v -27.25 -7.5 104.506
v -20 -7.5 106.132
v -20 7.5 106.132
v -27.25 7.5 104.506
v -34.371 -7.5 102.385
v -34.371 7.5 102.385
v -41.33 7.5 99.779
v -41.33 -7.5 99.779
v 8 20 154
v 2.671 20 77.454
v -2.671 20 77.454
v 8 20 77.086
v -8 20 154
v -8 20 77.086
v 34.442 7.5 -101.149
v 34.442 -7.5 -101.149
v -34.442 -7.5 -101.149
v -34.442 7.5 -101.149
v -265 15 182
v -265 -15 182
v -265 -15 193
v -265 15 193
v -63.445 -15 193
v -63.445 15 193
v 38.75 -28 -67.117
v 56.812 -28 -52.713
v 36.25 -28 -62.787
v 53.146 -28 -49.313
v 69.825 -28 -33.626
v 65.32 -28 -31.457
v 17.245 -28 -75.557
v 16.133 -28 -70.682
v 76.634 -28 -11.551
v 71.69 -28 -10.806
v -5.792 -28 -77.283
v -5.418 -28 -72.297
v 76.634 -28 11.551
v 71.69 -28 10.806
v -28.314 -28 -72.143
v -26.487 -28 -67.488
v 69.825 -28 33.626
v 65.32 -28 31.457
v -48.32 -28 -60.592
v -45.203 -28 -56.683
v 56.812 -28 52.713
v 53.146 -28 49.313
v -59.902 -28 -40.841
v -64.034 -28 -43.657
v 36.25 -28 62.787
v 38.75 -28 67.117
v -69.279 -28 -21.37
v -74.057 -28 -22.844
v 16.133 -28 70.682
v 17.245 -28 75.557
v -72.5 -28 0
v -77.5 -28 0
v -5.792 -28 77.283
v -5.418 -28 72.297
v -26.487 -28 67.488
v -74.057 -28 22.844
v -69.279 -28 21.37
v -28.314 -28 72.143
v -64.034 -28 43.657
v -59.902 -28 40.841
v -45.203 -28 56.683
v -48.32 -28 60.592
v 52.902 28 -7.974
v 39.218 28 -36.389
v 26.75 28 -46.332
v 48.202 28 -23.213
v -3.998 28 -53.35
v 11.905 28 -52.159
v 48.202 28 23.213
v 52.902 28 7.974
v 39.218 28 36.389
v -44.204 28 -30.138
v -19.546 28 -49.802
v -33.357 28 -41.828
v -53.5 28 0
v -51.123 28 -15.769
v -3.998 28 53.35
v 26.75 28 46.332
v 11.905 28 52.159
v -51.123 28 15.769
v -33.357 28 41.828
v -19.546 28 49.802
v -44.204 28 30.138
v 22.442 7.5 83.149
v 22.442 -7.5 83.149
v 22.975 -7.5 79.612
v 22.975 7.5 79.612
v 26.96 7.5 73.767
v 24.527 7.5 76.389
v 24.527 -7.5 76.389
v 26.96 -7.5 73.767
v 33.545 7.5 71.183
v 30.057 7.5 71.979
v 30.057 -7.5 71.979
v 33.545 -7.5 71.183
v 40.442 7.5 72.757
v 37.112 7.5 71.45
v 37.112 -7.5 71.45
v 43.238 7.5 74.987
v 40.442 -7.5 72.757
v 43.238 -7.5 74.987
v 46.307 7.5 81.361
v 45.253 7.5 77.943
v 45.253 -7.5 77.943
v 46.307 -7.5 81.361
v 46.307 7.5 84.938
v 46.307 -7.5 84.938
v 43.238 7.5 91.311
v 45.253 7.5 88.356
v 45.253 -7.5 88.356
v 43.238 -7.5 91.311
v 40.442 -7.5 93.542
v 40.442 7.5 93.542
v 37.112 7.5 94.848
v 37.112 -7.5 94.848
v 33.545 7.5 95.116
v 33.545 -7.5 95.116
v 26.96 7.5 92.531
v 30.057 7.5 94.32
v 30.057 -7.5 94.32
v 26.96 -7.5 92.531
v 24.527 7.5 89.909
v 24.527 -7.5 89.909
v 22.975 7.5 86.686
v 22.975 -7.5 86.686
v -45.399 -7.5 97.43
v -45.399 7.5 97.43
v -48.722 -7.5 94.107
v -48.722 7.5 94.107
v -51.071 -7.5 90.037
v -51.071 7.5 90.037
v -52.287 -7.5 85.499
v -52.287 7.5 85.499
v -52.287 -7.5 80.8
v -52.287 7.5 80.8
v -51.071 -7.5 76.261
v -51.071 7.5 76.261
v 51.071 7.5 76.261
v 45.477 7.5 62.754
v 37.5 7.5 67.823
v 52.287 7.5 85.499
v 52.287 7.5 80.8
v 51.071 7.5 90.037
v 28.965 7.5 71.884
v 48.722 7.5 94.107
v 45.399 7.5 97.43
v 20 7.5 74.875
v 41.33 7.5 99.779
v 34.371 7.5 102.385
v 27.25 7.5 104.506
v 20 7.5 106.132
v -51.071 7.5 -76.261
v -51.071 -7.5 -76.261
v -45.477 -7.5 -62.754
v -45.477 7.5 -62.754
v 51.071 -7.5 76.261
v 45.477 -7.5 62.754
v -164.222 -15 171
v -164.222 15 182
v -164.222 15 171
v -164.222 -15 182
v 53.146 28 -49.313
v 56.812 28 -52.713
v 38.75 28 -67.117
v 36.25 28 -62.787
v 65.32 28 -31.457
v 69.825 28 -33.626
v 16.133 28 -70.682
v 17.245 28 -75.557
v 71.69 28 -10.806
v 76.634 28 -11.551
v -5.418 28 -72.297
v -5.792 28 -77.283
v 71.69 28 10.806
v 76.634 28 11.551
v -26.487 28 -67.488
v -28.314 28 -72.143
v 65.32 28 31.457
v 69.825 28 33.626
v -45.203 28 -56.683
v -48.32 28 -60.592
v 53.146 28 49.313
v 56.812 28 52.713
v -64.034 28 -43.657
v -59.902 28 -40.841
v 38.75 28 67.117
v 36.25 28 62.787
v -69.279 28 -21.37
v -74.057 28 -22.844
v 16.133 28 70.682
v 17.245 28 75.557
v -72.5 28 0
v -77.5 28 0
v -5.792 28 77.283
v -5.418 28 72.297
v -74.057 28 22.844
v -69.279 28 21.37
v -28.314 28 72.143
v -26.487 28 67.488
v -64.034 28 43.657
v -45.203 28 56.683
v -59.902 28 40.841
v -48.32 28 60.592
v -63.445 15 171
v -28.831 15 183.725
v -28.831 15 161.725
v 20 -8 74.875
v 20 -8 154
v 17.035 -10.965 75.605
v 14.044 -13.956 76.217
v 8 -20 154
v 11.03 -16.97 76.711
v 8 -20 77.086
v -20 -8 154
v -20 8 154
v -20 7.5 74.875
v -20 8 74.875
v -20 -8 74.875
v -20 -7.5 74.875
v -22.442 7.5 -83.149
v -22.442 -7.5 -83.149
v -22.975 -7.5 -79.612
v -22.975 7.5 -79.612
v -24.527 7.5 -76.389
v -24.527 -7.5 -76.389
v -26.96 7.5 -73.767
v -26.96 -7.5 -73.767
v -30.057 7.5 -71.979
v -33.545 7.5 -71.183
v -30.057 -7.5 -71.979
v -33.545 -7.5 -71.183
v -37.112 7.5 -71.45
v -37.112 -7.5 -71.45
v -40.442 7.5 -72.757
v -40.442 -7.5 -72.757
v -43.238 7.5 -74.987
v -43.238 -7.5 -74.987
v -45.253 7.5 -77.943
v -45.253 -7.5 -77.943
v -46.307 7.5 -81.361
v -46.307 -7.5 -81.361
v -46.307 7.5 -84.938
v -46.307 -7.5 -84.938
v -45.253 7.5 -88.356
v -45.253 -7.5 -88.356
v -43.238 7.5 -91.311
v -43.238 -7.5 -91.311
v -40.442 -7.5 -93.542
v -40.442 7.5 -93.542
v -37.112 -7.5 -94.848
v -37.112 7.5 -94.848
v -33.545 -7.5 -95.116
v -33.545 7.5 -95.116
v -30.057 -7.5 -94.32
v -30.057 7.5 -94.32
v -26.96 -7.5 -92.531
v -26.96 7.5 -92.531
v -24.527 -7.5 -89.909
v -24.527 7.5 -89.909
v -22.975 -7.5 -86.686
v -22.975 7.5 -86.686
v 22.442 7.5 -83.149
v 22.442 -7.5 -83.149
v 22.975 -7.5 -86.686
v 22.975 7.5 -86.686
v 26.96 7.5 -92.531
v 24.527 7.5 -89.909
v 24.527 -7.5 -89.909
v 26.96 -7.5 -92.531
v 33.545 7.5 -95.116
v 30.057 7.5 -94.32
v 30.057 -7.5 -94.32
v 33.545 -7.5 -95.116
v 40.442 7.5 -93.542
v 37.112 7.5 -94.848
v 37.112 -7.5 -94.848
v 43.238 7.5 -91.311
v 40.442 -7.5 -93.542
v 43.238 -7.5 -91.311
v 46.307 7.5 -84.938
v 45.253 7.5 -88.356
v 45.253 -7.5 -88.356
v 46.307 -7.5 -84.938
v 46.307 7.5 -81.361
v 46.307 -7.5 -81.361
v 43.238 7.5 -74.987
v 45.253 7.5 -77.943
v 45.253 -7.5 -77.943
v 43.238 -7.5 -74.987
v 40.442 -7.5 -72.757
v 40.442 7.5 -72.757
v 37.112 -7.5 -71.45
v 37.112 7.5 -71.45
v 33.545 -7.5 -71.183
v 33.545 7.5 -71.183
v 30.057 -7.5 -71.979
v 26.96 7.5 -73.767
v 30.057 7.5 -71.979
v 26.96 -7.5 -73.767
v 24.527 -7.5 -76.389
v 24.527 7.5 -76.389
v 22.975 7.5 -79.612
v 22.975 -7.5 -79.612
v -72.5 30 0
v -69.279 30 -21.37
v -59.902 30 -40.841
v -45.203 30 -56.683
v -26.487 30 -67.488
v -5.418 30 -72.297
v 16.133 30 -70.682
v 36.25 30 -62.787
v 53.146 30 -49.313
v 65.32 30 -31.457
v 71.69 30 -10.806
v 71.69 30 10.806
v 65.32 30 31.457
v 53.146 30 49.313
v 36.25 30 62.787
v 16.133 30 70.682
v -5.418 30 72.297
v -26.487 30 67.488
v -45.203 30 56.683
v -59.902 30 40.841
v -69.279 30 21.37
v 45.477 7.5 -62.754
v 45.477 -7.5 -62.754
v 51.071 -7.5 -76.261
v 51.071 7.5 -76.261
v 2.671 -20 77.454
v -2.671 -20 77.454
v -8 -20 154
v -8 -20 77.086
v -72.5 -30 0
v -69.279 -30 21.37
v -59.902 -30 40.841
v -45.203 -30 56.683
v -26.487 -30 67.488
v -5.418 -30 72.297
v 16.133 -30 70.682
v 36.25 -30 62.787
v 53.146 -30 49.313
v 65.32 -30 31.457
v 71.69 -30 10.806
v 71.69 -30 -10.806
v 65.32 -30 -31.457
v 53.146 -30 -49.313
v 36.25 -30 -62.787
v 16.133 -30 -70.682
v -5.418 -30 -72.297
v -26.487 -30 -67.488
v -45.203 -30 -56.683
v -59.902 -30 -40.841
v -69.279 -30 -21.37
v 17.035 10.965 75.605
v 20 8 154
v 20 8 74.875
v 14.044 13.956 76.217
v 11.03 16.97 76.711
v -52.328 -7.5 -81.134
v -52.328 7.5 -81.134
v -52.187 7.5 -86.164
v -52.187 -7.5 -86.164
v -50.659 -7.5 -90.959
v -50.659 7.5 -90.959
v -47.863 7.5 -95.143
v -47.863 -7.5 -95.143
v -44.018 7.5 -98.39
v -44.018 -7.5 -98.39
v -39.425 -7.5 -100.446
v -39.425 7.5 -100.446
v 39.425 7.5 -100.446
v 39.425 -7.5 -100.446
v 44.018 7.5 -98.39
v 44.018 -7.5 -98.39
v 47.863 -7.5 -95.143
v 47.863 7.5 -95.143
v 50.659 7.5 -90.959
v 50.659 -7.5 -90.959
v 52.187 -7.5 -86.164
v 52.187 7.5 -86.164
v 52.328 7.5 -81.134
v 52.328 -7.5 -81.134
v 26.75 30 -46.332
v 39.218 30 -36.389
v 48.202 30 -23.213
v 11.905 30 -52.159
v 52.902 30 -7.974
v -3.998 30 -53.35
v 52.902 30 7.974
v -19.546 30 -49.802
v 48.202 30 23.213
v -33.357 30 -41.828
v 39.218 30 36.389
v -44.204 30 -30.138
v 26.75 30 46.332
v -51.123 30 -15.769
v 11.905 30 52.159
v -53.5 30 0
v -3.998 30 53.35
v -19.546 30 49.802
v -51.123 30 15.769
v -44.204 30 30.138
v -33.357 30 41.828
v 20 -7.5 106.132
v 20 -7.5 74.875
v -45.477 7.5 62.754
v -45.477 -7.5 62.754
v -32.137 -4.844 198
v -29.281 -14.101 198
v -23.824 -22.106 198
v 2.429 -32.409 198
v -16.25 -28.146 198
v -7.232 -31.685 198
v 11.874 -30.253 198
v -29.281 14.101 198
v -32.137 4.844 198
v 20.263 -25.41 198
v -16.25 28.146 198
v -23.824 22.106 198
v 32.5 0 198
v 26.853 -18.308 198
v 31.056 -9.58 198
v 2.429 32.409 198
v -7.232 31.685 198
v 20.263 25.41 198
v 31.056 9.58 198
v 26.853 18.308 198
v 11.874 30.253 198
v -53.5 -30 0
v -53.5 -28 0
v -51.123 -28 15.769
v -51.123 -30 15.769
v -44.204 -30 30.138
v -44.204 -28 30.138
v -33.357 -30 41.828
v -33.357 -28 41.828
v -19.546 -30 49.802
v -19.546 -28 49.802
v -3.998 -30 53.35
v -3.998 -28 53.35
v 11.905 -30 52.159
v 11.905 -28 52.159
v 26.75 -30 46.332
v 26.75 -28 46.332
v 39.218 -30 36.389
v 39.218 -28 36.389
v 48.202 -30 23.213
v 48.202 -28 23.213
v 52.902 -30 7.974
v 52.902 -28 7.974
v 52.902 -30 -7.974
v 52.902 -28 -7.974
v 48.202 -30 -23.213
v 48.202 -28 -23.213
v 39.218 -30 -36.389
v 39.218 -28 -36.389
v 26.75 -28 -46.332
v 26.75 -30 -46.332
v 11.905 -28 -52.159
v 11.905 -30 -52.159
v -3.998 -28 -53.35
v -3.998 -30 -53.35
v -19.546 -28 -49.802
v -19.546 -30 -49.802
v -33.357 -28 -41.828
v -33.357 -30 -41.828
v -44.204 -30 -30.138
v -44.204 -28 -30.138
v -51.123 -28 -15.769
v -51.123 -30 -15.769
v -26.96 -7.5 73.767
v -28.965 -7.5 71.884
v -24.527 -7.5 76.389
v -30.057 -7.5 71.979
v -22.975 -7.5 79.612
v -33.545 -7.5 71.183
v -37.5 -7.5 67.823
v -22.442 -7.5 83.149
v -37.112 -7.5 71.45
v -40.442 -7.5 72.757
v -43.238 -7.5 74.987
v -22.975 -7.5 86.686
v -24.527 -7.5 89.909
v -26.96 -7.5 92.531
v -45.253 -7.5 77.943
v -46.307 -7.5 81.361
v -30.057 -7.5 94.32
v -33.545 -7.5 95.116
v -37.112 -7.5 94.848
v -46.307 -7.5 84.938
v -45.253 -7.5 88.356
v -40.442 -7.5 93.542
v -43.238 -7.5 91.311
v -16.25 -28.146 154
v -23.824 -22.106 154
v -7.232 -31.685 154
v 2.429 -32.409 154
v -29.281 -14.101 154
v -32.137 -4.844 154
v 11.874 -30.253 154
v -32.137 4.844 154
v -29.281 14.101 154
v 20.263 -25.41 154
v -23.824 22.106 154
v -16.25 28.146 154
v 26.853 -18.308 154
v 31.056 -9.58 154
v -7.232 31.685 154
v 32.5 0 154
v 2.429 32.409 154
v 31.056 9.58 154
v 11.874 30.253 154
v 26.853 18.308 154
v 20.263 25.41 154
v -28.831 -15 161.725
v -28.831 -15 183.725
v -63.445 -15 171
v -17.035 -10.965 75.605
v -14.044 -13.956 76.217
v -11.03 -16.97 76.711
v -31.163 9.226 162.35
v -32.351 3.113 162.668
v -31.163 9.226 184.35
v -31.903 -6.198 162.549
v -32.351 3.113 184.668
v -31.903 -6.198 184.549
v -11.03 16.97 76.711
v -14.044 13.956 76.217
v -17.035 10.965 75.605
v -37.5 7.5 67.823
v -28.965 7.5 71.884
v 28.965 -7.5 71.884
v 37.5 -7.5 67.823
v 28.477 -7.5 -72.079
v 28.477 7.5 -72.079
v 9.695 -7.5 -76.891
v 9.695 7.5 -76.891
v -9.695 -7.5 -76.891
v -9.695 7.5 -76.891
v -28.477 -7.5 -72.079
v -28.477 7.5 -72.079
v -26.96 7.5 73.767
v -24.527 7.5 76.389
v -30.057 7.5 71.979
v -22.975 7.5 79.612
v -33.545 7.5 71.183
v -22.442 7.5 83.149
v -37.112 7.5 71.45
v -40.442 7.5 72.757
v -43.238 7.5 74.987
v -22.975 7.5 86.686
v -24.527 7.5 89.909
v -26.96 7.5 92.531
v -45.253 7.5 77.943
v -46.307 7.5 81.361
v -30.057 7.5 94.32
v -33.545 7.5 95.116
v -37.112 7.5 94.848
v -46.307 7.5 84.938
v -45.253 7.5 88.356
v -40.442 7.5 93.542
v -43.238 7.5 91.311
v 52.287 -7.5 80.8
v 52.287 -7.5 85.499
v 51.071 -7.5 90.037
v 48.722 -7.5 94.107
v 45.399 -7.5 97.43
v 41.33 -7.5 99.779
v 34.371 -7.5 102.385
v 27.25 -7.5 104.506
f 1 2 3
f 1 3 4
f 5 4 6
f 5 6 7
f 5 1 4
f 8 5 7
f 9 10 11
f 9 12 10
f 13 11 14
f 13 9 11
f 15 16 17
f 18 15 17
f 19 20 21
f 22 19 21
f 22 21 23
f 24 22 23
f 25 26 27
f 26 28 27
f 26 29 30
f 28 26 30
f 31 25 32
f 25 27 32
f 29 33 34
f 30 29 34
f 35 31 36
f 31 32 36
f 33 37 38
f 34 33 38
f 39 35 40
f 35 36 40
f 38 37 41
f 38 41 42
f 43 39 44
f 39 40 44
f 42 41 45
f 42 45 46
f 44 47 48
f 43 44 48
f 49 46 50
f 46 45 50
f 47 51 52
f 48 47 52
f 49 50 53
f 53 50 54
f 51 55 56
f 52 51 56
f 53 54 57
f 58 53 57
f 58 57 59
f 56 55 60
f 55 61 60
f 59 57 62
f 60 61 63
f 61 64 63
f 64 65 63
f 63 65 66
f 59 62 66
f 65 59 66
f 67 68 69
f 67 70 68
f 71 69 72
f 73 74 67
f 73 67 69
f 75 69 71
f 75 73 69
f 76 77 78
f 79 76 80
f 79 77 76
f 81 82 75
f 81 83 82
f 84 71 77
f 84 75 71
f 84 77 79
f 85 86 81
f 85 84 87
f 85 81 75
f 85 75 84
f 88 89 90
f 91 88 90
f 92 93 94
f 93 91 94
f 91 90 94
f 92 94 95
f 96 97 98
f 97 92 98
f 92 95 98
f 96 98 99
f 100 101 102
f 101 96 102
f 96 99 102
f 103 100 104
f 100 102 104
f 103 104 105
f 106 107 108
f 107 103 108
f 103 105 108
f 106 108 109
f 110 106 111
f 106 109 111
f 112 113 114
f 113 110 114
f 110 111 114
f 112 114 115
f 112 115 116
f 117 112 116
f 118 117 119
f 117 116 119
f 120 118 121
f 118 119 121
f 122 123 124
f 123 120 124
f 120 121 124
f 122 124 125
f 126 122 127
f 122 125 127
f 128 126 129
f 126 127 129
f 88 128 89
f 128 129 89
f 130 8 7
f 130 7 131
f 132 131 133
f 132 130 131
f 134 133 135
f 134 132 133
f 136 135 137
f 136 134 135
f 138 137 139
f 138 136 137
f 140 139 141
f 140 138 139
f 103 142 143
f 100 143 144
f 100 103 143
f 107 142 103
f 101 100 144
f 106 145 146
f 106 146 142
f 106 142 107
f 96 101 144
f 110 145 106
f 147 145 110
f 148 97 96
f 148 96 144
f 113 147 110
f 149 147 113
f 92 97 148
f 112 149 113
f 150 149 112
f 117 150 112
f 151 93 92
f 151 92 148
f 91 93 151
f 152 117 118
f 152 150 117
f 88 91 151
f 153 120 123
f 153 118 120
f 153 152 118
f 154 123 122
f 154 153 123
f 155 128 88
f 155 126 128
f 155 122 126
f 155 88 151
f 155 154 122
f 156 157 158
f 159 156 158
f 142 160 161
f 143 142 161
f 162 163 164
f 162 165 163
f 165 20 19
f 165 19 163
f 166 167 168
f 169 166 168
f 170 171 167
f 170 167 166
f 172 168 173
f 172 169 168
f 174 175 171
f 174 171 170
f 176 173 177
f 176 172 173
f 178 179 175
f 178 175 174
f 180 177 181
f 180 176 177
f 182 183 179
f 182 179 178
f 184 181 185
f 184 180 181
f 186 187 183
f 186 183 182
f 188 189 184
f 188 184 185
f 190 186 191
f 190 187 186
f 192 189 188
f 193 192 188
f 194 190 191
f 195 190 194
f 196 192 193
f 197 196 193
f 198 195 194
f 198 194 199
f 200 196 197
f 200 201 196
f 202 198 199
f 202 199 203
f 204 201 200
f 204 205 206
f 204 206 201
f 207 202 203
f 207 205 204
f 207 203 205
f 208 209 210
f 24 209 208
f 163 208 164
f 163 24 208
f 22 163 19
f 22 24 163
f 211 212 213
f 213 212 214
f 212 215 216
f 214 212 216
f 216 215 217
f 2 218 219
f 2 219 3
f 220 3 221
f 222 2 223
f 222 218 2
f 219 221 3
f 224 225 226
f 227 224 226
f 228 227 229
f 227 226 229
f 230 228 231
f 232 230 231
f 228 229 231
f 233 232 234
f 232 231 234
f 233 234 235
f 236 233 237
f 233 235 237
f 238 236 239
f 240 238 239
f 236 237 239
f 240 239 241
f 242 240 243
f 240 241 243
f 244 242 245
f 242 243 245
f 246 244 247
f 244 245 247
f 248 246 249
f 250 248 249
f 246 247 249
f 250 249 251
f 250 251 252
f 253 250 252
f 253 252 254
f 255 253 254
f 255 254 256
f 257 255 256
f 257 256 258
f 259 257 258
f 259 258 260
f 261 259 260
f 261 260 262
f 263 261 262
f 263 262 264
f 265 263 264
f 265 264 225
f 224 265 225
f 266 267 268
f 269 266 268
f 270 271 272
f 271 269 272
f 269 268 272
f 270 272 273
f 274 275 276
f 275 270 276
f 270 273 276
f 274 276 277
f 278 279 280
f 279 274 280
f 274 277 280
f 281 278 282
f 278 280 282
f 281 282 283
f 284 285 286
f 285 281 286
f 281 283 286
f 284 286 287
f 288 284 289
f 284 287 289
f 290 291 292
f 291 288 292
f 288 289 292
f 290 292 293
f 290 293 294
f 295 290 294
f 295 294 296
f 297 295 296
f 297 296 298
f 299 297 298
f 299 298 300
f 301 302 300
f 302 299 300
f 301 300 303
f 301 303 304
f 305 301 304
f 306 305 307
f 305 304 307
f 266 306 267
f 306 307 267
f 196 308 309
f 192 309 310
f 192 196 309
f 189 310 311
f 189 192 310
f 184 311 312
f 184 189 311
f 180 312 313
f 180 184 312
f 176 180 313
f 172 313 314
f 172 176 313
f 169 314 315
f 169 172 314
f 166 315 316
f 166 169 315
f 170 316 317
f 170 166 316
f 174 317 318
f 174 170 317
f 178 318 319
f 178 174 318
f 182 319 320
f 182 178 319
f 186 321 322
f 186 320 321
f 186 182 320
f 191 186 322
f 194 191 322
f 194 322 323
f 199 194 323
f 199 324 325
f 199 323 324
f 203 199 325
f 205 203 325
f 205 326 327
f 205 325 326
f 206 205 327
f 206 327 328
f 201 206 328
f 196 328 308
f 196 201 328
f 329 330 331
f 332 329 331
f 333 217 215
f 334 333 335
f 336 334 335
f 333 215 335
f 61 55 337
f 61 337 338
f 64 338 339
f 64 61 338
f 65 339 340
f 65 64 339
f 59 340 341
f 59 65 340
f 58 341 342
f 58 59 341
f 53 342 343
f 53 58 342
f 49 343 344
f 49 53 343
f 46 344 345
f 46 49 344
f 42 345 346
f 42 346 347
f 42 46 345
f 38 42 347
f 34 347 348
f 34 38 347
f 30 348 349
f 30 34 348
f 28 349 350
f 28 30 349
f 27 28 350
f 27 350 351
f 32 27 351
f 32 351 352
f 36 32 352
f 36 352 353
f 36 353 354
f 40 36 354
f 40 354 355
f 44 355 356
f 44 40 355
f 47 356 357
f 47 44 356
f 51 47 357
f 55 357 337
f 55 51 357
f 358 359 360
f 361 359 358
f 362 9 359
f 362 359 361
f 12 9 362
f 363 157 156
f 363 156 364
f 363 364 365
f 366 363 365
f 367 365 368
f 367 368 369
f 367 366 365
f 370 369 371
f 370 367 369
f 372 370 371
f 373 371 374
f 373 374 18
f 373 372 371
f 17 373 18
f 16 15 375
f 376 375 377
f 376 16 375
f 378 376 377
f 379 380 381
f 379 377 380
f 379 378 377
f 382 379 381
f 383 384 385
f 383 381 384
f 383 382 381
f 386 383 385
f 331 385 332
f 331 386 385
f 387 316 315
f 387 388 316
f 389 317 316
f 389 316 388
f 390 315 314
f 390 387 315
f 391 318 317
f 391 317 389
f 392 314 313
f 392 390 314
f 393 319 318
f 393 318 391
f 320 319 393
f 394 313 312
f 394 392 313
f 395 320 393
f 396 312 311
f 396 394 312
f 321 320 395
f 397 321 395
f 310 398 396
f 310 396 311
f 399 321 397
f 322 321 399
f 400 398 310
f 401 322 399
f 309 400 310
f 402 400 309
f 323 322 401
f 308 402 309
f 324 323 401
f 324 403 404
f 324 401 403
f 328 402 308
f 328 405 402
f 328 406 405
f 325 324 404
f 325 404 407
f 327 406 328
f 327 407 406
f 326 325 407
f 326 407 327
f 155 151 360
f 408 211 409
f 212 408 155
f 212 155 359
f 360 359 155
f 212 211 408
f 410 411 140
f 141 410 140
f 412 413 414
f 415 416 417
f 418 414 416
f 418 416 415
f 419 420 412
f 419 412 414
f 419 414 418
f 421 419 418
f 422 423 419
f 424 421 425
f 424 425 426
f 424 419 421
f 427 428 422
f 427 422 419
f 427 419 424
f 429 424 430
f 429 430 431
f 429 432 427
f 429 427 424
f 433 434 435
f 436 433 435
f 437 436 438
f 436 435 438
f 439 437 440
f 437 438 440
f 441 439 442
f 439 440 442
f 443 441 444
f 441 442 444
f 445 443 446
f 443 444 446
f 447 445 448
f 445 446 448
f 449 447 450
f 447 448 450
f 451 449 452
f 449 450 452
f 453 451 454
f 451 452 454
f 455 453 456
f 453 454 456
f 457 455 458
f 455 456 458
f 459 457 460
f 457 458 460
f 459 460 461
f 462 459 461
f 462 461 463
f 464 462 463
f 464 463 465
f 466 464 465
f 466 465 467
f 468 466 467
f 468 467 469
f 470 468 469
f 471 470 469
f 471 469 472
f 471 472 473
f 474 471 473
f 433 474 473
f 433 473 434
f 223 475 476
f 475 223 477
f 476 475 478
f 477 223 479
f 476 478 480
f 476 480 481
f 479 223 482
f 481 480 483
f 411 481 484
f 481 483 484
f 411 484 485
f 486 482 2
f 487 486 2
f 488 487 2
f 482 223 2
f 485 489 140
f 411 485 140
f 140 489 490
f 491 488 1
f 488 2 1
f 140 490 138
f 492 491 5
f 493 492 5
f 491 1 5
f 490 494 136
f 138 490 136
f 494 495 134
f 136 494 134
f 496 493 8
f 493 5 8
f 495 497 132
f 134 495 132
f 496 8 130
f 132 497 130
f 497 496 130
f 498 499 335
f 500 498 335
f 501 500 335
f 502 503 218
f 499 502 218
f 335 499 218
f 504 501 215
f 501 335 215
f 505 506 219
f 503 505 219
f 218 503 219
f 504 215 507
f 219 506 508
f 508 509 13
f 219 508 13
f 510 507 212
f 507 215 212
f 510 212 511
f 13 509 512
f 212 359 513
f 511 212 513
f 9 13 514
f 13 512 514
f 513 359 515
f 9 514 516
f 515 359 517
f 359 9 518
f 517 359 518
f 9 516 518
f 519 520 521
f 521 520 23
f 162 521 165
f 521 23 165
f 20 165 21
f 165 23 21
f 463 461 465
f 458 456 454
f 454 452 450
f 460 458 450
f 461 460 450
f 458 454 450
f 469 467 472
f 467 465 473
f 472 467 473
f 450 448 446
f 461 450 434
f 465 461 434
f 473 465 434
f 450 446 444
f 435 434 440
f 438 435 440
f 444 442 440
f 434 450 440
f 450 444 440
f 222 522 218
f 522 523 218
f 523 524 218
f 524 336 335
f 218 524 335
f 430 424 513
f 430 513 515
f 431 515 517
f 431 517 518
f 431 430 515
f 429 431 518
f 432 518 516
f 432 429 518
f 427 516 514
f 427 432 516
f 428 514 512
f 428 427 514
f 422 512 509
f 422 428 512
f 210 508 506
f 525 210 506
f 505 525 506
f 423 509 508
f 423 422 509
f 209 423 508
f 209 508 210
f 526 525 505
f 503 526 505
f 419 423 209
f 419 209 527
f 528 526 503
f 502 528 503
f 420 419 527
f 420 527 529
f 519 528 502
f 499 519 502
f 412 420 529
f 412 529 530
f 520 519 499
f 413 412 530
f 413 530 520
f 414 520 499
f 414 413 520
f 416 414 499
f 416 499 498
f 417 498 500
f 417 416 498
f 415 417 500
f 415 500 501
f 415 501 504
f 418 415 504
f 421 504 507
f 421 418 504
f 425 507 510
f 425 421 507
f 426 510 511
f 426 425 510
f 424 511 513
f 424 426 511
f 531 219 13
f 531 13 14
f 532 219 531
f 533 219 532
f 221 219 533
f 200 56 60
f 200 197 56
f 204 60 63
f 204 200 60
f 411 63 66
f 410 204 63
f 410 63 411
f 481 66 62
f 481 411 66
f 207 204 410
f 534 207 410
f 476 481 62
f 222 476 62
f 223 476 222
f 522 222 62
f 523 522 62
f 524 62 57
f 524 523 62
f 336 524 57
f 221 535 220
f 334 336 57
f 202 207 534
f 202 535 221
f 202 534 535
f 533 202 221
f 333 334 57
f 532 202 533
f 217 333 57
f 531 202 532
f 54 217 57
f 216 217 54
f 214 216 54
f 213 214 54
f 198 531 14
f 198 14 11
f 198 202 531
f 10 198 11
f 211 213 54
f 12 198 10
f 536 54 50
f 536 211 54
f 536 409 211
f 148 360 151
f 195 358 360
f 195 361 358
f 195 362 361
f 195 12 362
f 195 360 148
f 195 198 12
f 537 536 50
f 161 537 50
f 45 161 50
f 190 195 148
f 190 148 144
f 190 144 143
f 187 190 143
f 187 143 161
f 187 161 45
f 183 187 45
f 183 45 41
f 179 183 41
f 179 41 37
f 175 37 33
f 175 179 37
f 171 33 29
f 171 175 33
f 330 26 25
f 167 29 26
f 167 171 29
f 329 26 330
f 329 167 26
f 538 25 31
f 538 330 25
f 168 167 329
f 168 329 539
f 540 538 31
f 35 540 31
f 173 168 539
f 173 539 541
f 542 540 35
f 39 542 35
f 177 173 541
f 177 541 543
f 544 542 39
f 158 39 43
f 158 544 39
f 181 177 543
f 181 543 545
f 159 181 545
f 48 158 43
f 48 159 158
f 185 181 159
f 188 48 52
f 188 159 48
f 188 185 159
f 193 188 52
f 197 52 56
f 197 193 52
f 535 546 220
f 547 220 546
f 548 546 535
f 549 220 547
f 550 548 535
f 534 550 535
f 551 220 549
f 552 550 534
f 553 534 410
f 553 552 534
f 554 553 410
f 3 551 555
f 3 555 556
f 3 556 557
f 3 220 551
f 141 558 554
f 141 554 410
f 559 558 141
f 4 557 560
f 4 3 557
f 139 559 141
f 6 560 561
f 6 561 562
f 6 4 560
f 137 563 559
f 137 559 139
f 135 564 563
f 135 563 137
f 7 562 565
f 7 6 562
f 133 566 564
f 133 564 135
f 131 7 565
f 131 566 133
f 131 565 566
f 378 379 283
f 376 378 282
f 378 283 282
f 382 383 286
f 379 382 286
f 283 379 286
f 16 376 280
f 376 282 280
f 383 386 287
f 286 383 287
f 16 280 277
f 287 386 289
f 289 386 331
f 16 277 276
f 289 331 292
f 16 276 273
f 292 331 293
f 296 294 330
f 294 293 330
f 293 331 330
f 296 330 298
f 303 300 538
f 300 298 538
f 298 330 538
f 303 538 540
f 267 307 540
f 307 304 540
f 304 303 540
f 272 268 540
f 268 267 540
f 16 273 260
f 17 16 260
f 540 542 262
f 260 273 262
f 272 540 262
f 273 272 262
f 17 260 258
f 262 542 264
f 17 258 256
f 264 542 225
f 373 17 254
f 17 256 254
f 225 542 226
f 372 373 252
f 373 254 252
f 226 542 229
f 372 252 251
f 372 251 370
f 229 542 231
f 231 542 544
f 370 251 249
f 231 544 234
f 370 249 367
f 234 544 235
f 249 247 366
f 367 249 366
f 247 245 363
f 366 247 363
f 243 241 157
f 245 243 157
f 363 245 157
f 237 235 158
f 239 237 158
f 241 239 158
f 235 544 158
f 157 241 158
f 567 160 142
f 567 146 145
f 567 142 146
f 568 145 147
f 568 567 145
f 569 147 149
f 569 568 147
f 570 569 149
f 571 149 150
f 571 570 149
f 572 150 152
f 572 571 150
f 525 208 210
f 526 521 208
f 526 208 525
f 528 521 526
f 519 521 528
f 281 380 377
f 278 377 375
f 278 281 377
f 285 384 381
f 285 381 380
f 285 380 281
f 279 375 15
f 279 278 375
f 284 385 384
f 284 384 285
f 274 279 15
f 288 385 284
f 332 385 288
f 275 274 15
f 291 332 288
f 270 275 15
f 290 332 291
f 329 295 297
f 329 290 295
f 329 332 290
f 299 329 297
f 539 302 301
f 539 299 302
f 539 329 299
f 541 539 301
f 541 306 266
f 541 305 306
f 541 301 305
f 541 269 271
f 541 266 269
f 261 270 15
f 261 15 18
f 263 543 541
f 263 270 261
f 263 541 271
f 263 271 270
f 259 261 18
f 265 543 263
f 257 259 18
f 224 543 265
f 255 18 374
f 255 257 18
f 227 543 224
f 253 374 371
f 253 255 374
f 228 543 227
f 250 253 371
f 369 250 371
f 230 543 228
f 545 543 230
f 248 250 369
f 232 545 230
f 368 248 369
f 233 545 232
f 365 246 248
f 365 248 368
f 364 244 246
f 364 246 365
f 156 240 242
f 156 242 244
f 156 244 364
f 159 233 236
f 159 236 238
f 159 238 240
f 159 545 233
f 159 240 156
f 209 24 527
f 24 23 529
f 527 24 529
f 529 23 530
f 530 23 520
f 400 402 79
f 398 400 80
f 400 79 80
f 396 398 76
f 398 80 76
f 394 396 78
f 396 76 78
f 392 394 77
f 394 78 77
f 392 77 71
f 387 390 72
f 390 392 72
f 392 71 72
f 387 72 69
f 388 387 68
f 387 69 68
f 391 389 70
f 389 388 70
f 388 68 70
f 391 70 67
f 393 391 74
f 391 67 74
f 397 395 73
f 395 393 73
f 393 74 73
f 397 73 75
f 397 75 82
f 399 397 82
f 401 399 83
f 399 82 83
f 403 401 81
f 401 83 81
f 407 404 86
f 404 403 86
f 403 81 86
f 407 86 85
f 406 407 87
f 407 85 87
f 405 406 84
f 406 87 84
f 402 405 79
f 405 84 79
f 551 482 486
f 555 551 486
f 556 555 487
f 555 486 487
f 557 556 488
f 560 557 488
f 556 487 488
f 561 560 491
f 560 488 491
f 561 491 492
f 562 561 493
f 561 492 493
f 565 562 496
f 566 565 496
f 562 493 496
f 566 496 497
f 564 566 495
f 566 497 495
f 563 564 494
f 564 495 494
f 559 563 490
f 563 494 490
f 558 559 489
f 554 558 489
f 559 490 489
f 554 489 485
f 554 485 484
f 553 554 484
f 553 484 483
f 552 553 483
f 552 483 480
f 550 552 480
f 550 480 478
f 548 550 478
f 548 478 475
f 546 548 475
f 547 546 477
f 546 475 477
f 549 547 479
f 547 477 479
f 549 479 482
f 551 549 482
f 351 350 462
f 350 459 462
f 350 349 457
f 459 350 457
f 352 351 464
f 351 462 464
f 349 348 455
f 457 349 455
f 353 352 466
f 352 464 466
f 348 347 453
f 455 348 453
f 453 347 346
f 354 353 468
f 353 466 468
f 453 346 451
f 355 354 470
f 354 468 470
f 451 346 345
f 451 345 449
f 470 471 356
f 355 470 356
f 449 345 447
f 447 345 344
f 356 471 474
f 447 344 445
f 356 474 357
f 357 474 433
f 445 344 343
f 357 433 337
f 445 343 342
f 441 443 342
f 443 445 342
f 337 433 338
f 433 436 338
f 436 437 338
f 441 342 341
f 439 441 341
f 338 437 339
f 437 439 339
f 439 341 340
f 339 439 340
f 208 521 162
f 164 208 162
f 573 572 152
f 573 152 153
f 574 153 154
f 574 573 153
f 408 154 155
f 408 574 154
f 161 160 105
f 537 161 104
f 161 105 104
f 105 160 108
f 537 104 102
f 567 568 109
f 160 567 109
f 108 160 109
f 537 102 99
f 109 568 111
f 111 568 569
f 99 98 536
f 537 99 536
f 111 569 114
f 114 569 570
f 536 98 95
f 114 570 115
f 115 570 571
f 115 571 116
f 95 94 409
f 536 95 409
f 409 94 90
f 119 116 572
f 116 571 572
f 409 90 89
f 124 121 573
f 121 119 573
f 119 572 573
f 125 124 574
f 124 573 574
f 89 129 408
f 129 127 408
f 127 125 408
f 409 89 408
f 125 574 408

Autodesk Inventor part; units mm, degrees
ref_plane "YZ Plane" through (0, 0, 0) normal (1, 0, 0) x (0, 1, 0)
ref_plane "XZ Plane" through (0, 0, 0) normal (0, 1, 0) x (-1, 0, 0)
ref_plane "XY Plane" through (0, 0, 0) normal (0, 0, 1) x (1, 0, 0)
sketch "Sketch1" plane through (0, 0, 0) normal (0, 1, 0) x (-1, 0, 0)
  circle A0 centre (0, 0) radius 72.5
  circle A1 centre (0, 0) radius 77.5
  circle A2 centre (0, 0) radius 53.5
  circle A3 centre (0, 0) radius 90 construction
  line L0 (0, 0) -> (-34.4415, 83.1492) construction
  circle A4 centre (-34.4415, 83.1492) radius 12
  line L1 (0, 154) -> (-32.5, 154)
  line L2 (-32.5, 154) -> (-32.5, 198)
  line L3 (-32.5, 198) -> (0, 198)
  line L4 (0, 198) -> (0, 154)
  line L5 (0, 140.825) -> (0, 198)
  line L6 (20, 74.8749) -> (-20, 74.8749)
  line L7 (-20, 74.8749) -> (-20, 154)
  line L8 (-20, 154) -> (20, 154)
  line L9 (20, 154) -> (20, 74.8749)
  line L10 (0, 0) -> (0, 198)
  line L11 (265, 193) -> (63.4449, 193)
  line L12 (63.4449, 193) -> (63.4449, 171)
  line L13 (63.4449, 171) -> (265, 171)
  line L14 (265, 171) -> (265, 193)
  line L15 (63.4449, 193) -> (0, 176)
  line L16 (63.4449, 171) -> (0, 154)
  line L17 (0, 154) -> (0, 176)
  arc A5 (-20, 106.132) -> (-41.3298, 99.779) centre (0, 0) ccw
  arc A6 (-41.3298, 99.779) -> (-51.0713, 76.2609) centre (-34.4415, 83.1492) ccw
  line L18 (-51.0713, 76.2609) -> (-45.4768, 62.7544)
  line L19 (-45.4768, 62.7544) -> (-20, 74.8749)
  line L20 (-20, 74.8749) -> (-20, 106.132)
  circle A7 centre (-34.4415, -83.1492) radius 12
  line L21 (0, 0) -> (-34.4415, -83.1492) construction
  line L22 (-45.4768, -62.7544) -> (-51.0713, -76.2609)
  arc A8 (-51.0713, -76.2609) -> (-34.4415, -101.1492) centre (-34.4415, -83.1492) ccw
  line L23 (-34.4415, -101.1492) -> (0, -101.1492)
  line L24 (0, -101.1492) -> (0, -77.5)
  line L25 (0, -77.5) -> (-45.4768, -62.7544)
  line L26 (265, 182) -> (164.2224, 182)
  line L27 (164.2224, 182) -> (164.2224, 171)
  line L28 (164.2224, 171) -> (265, 171)
  line L29 (265, 171) -> (265, 182)
  dimension "oDiaGasket" = 145
  dimension "oDiaOutside" = 155
  dimension "oDiaInside" = 107
  dimension "oHoledia" = 24
  dimension "oStemThick" = 40
  dimension "oAngleFirstBolt" = 22.5
  dimension "oKcircle" = 180
  dimension "oDiaTop" = 65
  dimension "oHeightTop" = 44
  dimension "oHandleLenght" = 265
  dimension "d10" = 5
  dimension "d11" = 15
  dimension "d13" = 6
  dimension "oCenterTop" = 198
  dimension "d32" = 22.5
  dimension "d33" = 6
sketch "Sketch2" plane through (0, 0, 0) normal (0, 1, 0) x (-1, 0, 0)
  circle A0 centre (0, 0) radius 77.5 projected
  circle A1 centre (0, 0) radius 72.5 projected
  circle A2 centre (0, 0) radius 53.5 projected
extrude "Extrusion4" add sketch "Sketch2" along normal mid plane 56 contours A0 | A1 | A2
extrude "Extrusion5" add sketch "Sketch2" along normal mid plane 60 contours A1
extrude "Extrusion6" add sketch "Sketch1" along normal mid plane 40 contours A1 L10 L5 L8 L9 | L7 L1 L5 L10 A1
revolve "Revolution1" add sketch "Sketch1" angle 360 about axis through (0, 0, 0) along (0, 0, 1) contours L1 L2 L3 L4
extrude "Extrusion8" add sketch "Sketch1" along normal mid plane 15 contours A2 | A1 L18 A6 A5 L7 | L24 L23 A8 L22 A1
mirror "Mirror1" about plane through (0, 0, 0) normal (1, 0, 0) of "Extrusion8"
extrude "Extrusion9" add sketch "Sketch1" along normal mid plane 30 contours L4 L15 L12 L16 | L12 L11 L14 L26 L27 L13
chamfer "Chamfer1" distance 12 angle 45 4 edges at (-20, 20, 114.4374) (20, 20, 114.4374) (-20, -20, 114.4374) (20, -20, 114.4374)
equation "\"d32\" = oAngleFirstBolt"
equation "\"d33\" = d13"
equation "\"d25\" = oStemThick"
properties part number "BUTTERFLY VALVE MANUAL WAFER TYPE DN100" material "GG25"
